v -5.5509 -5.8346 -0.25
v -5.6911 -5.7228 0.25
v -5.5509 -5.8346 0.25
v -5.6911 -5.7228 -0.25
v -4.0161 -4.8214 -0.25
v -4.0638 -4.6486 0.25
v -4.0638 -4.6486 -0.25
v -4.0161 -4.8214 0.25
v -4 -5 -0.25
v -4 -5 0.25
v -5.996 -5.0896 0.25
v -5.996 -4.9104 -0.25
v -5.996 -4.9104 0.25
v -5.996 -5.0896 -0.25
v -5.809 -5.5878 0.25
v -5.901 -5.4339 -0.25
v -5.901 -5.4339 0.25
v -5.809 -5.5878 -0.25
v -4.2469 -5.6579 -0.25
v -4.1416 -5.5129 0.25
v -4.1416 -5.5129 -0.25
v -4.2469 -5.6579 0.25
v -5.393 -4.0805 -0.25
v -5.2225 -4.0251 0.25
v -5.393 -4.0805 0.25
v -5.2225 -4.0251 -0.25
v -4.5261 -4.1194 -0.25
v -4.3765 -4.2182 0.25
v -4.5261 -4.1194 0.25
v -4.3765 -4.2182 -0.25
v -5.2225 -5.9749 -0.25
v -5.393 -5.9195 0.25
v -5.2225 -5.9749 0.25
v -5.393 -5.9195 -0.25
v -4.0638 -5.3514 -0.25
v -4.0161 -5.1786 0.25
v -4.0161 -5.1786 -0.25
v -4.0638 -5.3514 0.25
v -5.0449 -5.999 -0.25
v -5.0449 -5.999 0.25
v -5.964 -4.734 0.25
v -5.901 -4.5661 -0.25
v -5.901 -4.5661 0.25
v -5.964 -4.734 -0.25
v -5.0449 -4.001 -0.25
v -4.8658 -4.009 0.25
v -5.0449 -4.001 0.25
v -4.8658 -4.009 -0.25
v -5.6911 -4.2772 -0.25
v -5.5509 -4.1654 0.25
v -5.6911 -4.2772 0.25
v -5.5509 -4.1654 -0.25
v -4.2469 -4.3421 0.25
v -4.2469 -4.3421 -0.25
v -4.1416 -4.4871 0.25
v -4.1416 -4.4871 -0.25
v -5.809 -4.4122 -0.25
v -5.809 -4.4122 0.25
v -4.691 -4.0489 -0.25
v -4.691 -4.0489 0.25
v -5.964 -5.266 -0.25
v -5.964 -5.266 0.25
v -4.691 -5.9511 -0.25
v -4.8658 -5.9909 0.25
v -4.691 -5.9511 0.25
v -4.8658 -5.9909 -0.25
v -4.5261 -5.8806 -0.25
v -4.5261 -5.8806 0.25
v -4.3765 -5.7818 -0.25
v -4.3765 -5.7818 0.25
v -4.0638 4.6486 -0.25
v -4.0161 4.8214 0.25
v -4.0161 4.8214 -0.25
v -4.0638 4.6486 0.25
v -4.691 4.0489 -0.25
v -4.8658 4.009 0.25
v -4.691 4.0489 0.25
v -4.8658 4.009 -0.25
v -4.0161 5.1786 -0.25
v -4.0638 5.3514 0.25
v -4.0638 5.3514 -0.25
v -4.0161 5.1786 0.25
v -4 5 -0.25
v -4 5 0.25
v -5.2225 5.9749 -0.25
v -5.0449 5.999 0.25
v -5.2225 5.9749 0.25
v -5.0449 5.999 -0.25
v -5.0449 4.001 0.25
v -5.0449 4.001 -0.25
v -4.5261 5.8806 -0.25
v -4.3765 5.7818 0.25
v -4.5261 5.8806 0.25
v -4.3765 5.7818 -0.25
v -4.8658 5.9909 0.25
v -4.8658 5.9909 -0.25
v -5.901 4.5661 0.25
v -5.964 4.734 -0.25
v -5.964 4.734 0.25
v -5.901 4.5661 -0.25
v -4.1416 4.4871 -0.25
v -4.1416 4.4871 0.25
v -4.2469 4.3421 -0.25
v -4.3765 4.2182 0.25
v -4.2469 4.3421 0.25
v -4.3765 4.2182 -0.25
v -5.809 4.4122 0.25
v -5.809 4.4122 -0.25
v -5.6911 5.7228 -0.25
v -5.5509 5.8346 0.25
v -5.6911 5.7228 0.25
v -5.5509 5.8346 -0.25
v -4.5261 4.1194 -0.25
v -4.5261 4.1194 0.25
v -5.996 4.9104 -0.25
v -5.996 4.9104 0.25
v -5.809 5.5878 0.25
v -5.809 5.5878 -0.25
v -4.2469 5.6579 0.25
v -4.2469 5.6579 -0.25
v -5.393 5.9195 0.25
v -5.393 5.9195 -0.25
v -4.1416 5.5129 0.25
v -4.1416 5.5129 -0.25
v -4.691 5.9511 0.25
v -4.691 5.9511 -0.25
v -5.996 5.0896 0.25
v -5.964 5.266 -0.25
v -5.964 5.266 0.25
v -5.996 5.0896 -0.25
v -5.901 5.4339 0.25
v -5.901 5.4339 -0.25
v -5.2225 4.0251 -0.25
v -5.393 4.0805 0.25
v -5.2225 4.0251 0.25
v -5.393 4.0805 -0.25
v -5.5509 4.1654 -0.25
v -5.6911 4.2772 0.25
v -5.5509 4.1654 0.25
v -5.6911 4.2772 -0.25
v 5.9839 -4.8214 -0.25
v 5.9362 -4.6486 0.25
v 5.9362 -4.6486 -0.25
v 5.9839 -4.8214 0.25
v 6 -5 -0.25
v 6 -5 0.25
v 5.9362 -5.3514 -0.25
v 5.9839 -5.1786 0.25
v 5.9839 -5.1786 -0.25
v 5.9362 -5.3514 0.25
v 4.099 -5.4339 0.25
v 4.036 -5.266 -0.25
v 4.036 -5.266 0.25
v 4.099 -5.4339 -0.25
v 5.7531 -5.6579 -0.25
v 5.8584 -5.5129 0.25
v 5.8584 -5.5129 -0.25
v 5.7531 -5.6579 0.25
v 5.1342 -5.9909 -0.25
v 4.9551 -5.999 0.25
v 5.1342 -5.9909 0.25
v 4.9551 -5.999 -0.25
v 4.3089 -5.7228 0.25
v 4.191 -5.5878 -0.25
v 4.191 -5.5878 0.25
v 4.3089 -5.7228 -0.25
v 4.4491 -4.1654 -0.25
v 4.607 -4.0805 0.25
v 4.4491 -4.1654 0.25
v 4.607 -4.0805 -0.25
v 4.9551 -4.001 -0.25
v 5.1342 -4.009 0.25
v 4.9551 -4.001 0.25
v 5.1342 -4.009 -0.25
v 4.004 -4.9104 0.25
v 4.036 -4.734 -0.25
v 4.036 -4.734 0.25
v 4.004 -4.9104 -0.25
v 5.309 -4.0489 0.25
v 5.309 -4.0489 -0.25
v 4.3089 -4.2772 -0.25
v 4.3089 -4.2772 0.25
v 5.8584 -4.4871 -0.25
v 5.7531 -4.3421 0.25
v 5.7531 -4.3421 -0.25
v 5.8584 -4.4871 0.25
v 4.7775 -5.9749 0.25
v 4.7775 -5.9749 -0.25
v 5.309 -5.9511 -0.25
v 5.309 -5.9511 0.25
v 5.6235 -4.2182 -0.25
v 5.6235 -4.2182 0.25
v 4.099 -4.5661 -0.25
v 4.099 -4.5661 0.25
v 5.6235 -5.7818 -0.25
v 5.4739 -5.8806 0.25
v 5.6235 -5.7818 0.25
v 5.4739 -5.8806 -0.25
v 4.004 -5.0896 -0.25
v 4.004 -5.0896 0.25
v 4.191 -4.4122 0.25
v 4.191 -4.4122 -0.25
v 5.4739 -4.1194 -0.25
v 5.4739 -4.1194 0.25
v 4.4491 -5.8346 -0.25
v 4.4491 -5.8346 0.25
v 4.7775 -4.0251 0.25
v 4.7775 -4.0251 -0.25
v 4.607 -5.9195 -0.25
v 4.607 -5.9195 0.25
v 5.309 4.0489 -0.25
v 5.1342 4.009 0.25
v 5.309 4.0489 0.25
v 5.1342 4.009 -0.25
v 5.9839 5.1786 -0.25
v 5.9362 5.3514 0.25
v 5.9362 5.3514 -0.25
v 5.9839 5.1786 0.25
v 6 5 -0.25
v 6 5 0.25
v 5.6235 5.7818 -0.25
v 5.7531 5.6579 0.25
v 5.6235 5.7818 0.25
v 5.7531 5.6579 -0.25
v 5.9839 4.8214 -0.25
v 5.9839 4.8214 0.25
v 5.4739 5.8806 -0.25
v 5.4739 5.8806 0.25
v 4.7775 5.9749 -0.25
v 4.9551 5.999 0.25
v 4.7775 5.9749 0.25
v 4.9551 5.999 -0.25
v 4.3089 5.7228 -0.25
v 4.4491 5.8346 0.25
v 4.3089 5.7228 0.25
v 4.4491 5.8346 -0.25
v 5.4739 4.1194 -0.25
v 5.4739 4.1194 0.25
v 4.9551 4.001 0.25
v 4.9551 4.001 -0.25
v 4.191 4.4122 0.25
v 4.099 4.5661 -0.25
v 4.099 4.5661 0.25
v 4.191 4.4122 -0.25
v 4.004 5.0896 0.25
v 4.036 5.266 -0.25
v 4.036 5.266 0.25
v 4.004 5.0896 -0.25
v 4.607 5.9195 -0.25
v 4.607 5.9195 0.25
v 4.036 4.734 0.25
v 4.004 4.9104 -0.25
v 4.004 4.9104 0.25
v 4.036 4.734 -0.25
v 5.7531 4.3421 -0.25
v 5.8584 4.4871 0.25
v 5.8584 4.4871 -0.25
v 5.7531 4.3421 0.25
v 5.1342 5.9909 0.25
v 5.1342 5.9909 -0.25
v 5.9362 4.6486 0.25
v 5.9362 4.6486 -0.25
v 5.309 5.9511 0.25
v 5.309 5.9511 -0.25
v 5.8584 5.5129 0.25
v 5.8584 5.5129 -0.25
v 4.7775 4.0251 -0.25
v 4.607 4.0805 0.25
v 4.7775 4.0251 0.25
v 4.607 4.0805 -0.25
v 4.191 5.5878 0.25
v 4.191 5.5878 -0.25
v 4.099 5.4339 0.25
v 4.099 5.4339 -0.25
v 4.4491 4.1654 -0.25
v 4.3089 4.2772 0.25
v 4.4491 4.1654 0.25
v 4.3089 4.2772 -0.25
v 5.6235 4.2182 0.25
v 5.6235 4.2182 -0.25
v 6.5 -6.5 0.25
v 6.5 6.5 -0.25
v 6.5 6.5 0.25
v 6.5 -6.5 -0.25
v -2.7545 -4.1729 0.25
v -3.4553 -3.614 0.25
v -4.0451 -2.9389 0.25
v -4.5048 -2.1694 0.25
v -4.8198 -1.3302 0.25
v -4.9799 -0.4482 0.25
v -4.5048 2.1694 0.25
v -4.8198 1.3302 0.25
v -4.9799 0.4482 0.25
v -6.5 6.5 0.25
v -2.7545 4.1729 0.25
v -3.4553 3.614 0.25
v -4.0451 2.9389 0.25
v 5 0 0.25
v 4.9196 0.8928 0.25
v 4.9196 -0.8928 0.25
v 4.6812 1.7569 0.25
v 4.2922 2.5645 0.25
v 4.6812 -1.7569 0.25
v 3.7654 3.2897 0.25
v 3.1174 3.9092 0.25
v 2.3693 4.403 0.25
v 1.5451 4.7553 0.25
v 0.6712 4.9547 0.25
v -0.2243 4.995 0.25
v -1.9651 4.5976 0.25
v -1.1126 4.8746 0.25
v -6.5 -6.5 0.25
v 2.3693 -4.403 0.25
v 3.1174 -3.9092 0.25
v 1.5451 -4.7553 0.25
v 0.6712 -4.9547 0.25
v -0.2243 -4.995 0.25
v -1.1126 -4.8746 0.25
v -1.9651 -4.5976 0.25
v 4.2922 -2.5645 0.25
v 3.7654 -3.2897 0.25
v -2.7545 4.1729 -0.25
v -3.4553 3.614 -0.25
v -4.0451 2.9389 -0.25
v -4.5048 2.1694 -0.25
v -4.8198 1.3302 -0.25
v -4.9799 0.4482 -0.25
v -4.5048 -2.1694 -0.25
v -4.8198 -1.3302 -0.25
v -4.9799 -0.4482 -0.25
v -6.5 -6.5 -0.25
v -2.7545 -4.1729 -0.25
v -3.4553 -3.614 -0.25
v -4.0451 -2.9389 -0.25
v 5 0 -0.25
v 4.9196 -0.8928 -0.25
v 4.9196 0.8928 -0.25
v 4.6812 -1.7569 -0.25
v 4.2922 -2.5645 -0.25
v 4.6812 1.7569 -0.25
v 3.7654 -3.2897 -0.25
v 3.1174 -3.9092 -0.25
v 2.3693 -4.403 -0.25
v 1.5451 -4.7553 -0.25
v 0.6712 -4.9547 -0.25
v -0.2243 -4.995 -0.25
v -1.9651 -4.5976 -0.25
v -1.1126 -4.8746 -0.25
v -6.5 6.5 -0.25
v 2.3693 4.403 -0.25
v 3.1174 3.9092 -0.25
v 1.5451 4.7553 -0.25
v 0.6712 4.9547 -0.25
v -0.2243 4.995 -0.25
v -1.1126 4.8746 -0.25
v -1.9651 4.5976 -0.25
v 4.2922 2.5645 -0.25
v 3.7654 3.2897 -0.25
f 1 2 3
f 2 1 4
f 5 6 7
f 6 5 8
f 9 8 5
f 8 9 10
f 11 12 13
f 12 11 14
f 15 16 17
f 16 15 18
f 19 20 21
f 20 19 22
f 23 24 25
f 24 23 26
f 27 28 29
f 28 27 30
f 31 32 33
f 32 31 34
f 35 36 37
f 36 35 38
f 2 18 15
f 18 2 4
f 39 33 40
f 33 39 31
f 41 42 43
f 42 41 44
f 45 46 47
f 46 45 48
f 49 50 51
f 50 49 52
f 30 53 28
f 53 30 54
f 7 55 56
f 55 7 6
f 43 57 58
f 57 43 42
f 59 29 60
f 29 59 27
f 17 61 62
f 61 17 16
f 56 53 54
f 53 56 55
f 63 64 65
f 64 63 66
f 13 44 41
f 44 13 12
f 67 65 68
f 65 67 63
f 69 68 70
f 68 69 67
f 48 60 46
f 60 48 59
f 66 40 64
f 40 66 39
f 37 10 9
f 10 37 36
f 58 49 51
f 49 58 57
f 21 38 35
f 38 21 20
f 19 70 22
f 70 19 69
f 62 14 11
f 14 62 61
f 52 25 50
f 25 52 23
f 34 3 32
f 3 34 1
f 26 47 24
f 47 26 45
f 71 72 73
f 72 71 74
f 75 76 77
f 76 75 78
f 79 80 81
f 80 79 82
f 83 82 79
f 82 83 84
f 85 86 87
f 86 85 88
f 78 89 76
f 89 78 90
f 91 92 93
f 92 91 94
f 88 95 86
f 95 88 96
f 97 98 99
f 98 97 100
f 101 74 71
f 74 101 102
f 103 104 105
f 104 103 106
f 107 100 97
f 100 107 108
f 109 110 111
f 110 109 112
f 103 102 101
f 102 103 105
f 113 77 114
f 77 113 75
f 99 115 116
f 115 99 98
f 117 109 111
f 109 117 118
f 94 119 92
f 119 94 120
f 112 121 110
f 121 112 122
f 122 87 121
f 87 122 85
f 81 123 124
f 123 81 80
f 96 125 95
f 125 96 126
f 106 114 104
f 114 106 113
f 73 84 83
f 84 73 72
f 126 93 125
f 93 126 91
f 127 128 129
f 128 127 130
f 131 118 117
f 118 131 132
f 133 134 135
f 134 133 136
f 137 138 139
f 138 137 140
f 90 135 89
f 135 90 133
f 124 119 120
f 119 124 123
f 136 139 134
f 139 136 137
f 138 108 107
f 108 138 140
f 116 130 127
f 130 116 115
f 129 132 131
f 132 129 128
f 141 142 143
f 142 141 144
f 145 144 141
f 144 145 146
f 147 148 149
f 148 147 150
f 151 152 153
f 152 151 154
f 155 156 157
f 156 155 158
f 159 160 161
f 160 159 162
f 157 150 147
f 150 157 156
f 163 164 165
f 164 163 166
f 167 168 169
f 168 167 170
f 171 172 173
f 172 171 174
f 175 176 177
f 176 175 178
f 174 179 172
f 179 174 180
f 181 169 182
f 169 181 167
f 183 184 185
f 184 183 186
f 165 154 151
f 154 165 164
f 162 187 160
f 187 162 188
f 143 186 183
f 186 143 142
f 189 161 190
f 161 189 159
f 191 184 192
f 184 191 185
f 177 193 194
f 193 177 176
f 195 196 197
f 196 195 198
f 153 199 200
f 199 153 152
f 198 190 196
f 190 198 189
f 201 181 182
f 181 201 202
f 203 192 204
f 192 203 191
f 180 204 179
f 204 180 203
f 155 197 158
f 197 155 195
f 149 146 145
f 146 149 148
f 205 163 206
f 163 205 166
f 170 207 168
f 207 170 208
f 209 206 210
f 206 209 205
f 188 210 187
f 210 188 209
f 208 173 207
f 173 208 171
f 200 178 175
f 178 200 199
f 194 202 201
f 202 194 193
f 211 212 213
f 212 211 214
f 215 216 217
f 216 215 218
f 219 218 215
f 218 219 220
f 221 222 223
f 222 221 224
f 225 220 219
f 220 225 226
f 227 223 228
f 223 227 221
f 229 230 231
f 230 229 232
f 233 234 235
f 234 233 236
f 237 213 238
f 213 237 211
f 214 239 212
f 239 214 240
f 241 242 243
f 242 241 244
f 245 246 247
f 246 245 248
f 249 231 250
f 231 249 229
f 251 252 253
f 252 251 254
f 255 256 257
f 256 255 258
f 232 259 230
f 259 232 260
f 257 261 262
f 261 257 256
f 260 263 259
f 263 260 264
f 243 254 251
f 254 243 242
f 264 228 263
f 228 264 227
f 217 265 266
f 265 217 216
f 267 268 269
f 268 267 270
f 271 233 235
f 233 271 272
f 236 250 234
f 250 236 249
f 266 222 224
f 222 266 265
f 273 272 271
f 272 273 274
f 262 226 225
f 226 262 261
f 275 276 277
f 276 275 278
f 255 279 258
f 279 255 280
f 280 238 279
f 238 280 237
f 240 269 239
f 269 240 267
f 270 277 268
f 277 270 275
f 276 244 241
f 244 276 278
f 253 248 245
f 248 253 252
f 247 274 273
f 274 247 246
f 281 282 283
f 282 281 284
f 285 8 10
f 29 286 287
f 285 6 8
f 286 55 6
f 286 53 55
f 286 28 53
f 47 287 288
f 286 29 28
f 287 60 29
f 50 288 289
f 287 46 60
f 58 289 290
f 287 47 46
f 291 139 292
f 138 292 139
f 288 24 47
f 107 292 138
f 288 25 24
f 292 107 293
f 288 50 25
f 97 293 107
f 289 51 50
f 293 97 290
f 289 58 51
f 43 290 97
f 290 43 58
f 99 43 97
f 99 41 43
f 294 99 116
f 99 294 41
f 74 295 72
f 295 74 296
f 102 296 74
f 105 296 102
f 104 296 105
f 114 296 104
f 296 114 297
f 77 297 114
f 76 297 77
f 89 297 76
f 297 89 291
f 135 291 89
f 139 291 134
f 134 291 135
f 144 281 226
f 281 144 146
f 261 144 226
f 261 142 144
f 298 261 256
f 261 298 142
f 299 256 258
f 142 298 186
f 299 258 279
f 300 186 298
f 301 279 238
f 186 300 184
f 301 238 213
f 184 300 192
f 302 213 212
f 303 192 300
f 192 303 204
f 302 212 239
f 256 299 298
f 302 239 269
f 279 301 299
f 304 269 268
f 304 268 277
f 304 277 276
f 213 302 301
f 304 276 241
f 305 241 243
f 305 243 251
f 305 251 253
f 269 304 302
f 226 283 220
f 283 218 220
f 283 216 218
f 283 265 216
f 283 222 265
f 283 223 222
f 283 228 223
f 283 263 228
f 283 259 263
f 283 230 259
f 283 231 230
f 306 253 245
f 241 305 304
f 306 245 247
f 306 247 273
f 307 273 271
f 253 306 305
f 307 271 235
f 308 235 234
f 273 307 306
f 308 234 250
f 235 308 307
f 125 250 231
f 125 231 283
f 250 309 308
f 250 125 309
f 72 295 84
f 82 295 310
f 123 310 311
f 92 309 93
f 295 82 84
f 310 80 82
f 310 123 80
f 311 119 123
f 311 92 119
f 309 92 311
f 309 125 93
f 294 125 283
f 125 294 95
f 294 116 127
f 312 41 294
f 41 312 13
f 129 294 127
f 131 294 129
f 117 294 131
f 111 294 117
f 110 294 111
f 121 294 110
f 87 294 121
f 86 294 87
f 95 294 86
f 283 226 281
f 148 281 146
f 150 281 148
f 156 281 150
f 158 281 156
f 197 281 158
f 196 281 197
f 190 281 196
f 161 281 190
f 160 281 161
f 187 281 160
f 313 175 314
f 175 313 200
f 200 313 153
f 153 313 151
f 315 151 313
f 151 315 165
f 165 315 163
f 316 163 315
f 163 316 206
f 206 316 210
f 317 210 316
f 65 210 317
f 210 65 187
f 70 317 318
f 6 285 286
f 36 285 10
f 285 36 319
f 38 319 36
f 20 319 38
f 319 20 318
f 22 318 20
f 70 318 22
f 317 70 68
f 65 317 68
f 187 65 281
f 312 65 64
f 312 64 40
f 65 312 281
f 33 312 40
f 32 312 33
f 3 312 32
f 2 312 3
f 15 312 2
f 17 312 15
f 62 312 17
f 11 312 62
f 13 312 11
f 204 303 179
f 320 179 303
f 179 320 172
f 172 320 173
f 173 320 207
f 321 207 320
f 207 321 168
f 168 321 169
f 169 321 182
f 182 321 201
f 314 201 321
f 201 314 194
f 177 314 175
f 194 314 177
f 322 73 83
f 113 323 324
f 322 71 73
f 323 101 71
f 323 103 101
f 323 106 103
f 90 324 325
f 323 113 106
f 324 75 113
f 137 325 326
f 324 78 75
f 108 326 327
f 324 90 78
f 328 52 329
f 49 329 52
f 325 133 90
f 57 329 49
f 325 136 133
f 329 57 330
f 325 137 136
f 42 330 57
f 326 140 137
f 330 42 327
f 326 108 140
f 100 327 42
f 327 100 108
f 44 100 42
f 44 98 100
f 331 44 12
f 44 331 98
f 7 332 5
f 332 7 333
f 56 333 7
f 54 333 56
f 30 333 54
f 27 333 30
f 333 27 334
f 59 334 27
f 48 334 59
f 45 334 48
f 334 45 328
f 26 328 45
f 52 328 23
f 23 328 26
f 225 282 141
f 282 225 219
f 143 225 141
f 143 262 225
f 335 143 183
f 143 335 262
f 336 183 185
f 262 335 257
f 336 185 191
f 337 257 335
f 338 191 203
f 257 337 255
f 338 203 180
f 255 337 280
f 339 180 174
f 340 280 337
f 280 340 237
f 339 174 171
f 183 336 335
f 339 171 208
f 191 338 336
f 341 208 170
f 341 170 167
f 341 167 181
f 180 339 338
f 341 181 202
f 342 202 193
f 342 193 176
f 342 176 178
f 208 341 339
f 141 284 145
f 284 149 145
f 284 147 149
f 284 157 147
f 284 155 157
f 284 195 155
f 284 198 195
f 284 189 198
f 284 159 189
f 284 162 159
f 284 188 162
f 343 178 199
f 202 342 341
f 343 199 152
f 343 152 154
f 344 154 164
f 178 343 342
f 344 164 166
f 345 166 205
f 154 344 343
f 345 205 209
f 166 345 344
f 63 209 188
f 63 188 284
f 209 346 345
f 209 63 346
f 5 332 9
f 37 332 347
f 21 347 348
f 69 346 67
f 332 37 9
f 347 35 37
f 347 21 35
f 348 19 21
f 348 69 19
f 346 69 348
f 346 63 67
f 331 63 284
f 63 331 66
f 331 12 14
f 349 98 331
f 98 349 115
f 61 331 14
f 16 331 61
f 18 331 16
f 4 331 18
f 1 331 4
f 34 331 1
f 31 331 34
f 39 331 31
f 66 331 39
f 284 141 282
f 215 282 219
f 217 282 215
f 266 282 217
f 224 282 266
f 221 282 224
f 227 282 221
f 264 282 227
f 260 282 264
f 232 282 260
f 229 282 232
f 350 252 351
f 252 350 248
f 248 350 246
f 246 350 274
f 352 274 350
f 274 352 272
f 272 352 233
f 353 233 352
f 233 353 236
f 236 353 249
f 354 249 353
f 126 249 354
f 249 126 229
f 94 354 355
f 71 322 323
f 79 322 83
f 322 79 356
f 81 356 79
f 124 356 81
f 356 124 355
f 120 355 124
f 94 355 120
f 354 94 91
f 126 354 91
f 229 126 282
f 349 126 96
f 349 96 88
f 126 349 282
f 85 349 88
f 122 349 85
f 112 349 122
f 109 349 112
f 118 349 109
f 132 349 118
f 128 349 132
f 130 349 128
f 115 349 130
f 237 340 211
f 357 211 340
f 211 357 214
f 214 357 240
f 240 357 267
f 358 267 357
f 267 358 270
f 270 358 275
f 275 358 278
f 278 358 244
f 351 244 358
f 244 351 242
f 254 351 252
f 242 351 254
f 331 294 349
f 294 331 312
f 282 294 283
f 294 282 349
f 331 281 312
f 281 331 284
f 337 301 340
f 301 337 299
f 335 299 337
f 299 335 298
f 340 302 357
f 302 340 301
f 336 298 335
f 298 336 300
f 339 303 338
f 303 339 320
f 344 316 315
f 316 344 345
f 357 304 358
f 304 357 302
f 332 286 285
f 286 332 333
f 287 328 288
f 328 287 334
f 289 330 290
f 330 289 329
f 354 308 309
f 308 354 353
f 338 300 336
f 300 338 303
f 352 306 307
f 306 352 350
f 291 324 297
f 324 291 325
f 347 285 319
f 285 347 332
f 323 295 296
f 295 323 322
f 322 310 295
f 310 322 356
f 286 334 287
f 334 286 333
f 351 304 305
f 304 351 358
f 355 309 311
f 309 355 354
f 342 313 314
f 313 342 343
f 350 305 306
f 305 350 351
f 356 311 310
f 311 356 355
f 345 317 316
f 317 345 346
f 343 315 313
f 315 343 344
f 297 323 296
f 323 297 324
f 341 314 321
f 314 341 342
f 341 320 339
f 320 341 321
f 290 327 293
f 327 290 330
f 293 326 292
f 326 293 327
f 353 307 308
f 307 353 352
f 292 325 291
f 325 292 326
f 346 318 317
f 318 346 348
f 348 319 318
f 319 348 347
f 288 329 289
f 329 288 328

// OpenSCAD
$fn=35;
SPKR_DIAM=10;

difference() {
    cube([SPKR_DIAM+3, SPKR_DIAM+3, 0.5], center=true);
    cylinder(h=1.1, r=SPKR_DIAM/2, center=true); // main speaker hole
    
    for(x= [-1, 1]) {
        for(y= [-1, 1]) {
            translate([5*x, 5*y, 0])
            cylinder(h=1.1, r=1, center=true);
        }
    }
}
